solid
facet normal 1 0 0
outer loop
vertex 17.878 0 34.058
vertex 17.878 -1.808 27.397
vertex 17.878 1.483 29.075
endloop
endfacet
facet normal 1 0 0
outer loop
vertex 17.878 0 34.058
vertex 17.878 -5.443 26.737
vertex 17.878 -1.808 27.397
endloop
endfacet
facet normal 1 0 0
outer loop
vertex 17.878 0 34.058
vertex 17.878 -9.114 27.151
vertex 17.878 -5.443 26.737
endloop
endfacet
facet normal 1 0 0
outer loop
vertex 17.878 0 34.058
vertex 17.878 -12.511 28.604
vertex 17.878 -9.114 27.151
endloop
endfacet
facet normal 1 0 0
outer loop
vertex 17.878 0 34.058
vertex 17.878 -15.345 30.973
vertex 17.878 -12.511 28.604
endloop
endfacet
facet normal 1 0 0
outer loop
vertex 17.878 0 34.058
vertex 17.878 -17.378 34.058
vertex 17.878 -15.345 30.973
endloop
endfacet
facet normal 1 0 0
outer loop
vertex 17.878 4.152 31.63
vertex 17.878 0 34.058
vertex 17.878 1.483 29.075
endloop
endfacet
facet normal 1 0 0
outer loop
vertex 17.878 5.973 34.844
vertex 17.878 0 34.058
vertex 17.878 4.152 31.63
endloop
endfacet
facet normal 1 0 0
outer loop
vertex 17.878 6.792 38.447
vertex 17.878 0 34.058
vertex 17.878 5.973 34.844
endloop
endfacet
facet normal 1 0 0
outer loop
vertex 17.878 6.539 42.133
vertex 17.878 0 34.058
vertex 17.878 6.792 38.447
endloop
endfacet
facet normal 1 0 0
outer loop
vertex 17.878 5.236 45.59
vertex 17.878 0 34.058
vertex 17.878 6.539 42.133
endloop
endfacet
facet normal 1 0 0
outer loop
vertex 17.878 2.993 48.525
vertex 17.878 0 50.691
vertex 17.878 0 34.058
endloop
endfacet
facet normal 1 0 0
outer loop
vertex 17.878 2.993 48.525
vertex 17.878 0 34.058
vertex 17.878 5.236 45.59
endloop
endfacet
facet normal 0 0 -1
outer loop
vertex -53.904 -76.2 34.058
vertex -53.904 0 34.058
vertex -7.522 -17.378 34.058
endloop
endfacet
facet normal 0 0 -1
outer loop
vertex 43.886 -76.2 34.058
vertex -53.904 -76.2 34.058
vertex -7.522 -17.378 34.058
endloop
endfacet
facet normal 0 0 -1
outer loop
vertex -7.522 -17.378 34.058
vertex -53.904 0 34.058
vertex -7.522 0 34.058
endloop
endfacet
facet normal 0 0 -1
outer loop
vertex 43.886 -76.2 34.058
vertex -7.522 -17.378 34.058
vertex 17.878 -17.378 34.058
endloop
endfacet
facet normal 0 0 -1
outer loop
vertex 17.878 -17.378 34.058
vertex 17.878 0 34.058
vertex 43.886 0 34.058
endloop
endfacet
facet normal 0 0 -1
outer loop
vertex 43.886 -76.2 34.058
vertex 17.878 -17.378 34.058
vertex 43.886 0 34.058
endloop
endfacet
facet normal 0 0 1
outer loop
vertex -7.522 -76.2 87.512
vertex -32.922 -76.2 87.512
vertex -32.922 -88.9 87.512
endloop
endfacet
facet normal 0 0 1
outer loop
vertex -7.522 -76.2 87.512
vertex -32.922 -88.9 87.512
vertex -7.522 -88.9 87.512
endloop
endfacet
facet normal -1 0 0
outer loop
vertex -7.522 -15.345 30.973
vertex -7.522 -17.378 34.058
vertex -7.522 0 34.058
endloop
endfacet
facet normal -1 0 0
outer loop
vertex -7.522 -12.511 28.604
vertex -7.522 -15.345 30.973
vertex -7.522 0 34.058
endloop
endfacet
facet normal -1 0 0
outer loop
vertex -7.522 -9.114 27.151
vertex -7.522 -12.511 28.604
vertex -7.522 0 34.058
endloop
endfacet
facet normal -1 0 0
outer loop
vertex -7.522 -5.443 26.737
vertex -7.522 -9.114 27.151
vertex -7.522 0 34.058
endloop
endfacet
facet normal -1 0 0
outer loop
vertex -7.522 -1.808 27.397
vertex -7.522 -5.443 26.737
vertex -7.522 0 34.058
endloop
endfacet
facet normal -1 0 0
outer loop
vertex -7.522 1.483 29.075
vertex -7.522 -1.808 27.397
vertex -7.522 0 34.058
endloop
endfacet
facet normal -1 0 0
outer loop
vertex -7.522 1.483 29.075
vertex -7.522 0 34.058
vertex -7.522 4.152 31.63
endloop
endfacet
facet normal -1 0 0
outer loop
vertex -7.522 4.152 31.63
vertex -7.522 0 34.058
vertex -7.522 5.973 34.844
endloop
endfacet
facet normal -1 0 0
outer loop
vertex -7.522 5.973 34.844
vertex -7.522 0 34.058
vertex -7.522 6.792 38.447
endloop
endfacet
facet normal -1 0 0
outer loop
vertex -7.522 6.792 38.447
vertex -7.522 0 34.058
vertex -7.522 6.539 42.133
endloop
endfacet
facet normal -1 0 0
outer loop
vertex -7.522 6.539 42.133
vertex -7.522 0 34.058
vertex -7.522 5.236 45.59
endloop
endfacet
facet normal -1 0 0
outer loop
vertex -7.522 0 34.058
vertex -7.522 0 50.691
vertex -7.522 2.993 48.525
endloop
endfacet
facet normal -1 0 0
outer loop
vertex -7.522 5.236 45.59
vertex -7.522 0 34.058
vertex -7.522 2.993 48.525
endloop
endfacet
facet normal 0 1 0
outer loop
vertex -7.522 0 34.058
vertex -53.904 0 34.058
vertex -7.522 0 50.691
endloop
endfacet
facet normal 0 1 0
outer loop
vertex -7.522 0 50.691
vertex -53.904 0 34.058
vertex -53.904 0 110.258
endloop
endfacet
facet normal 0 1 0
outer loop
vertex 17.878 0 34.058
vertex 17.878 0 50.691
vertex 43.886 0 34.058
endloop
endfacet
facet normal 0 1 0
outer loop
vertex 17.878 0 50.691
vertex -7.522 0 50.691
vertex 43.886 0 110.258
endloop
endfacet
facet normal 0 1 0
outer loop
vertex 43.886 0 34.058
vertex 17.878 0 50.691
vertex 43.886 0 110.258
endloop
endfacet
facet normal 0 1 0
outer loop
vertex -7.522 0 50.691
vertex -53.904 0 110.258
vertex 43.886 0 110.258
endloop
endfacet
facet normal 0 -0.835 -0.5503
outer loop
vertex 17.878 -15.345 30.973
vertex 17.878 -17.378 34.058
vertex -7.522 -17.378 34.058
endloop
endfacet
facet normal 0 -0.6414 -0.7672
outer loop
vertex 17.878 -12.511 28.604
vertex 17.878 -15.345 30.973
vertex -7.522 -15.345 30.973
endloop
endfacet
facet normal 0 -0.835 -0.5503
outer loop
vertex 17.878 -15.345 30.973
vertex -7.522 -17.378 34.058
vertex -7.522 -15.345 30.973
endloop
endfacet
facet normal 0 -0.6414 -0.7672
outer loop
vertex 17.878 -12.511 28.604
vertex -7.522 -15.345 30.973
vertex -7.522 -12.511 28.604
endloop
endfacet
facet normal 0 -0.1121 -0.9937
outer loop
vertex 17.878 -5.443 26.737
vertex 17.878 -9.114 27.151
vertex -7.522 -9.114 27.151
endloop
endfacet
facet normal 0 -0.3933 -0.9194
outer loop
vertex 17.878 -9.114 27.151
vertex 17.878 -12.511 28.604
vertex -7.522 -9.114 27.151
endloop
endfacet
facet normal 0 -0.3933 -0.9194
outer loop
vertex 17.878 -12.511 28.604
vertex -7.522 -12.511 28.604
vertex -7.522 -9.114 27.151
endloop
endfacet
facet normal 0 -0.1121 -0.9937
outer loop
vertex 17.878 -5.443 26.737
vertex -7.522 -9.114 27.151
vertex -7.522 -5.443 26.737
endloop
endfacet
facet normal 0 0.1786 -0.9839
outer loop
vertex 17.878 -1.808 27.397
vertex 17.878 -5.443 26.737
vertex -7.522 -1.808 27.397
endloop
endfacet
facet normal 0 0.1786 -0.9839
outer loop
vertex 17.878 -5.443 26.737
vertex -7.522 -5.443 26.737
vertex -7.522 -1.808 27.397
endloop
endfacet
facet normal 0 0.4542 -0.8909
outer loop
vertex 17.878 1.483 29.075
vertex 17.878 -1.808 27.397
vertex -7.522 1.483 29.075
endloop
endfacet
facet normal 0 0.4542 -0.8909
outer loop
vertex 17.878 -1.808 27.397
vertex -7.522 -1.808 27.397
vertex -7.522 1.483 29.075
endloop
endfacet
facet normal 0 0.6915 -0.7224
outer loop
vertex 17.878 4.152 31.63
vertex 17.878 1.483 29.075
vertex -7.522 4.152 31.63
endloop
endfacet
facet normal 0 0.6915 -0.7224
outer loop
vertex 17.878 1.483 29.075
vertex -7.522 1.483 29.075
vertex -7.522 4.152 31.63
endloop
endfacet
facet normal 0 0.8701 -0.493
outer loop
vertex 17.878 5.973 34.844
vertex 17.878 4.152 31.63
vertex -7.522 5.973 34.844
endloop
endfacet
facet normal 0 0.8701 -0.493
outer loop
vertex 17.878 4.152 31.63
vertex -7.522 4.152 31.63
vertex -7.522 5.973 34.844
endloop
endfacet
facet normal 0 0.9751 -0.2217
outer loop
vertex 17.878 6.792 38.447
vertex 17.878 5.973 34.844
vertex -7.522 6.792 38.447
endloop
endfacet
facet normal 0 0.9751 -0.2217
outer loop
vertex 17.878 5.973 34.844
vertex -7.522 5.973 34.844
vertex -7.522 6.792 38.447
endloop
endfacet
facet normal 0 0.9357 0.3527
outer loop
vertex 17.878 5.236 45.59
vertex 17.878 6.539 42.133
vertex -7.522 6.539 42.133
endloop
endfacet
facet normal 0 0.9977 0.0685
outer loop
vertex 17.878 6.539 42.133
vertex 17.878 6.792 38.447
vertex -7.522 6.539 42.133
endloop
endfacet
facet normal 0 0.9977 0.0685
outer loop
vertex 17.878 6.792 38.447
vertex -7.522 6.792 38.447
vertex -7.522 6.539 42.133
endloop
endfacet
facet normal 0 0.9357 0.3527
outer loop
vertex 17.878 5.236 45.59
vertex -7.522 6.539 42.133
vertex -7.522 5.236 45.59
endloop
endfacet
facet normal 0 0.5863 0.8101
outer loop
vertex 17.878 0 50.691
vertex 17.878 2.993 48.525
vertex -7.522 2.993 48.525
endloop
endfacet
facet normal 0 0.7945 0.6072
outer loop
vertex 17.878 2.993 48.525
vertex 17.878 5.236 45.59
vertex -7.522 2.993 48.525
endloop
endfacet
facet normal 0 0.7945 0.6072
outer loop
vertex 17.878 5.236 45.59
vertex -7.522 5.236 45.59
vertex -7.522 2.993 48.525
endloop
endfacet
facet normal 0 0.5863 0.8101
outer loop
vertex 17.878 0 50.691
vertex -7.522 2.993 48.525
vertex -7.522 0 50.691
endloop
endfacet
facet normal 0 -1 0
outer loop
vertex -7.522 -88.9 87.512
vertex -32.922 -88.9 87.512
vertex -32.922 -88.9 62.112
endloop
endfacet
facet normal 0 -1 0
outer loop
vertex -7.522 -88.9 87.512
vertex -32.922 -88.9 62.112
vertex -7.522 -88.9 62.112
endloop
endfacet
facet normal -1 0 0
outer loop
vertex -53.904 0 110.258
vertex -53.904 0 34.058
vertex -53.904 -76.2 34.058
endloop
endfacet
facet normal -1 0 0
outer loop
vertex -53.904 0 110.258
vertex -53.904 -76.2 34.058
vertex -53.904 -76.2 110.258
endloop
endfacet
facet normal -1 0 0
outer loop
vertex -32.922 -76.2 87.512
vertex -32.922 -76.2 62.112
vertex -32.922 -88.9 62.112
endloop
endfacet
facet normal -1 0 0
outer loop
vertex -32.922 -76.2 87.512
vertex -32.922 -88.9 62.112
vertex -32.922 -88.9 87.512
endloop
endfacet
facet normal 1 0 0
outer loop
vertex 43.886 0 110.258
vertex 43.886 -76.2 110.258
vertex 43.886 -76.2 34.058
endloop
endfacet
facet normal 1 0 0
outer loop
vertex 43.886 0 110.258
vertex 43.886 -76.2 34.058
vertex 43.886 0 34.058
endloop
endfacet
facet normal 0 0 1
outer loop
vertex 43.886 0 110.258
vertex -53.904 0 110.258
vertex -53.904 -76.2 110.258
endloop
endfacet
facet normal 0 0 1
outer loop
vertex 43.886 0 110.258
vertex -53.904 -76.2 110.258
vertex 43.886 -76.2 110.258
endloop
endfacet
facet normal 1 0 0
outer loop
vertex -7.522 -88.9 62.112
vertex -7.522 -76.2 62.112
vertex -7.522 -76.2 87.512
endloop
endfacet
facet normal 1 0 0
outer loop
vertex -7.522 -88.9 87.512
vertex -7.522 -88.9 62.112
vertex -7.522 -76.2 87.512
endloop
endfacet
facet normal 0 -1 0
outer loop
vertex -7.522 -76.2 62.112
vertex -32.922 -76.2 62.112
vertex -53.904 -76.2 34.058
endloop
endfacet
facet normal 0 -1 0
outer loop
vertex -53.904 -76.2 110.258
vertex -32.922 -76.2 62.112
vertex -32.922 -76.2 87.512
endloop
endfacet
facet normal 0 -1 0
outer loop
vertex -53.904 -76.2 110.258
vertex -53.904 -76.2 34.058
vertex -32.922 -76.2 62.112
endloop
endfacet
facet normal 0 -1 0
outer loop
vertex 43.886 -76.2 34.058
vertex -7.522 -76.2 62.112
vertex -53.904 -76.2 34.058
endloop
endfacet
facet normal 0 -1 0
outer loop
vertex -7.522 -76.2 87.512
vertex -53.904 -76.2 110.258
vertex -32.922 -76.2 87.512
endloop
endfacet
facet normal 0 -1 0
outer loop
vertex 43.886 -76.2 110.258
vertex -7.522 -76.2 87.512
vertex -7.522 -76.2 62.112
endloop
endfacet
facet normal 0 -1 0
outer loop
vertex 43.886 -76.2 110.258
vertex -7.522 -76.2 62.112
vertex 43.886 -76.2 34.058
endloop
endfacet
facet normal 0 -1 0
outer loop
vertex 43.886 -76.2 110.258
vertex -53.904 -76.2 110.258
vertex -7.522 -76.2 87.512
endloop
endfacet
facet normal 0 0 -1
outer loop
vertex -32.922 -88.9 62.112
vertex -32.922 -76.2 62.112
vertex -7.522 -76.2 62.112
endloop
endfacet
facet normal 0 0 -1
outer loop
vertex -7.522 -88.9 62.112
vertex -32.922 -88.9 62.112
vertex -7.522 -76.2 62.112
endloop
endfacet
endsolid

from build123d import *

# Parameters (mm, degrees)
F0_W       = 76.2
F0_H       = 76.2
F1_DEPTH   = 76.2
F2_W       = 25.4
F2_H       = 25.4
F3_DEPTH   = 12.7
F4_R       = 12.7
F1_FACE1_W = 76.2
F1_FACE1_H = 76.2
F5_DEPTH   = 21.59
F6_DEPTH   = 25.4


with BuildPart() as f1:
    # F0 (on Front) → F1 (new body)
    with BuildSketch(Plane.XZ):
        with Locations((-15.8040157244, 72.1577832595)):
            Rectangle(F0_W, F0_H)
    extrude(amount=F1_DEPTH)

    # F2 (on face) → F3 (join)
    with BuildSketch(Plane.XZ.offset(76.2)):
        with Locations((-20.2220443964, 74.8119402349)):
            Rectangle(F2_W, F2_H)
    extrude(amount=F3_DEPTH)

    # F4 (on face) + F1_face1 (on face) → F5 (join)
    with BuildSketch(Plane.YZ.offset(-7.5220443964)):
        with Locations((-5.8702160604, 39.4294373691)):
            Circle(F4_R)
    with BuildSketch(Plane(origin=(22.2959842756, -38.1, 72.1577832595), x_dir=(0, 1, 0), z_dir=(1, 0, 0))):
        Rectangle(F1_FACE1_W, F1_FACE1_H)
    extrude(amount=F5_DEPTH)

    # F4 (on face) → F6 (join)
    with BuildSketch(Plane.YZ.offset(-7.5220443964)):
        with Locations((-5.8702160604, 39.4294373691)):
            Circle(F4_R)
    extrude(amount=F6_DEPTH)


solid = f1.part
